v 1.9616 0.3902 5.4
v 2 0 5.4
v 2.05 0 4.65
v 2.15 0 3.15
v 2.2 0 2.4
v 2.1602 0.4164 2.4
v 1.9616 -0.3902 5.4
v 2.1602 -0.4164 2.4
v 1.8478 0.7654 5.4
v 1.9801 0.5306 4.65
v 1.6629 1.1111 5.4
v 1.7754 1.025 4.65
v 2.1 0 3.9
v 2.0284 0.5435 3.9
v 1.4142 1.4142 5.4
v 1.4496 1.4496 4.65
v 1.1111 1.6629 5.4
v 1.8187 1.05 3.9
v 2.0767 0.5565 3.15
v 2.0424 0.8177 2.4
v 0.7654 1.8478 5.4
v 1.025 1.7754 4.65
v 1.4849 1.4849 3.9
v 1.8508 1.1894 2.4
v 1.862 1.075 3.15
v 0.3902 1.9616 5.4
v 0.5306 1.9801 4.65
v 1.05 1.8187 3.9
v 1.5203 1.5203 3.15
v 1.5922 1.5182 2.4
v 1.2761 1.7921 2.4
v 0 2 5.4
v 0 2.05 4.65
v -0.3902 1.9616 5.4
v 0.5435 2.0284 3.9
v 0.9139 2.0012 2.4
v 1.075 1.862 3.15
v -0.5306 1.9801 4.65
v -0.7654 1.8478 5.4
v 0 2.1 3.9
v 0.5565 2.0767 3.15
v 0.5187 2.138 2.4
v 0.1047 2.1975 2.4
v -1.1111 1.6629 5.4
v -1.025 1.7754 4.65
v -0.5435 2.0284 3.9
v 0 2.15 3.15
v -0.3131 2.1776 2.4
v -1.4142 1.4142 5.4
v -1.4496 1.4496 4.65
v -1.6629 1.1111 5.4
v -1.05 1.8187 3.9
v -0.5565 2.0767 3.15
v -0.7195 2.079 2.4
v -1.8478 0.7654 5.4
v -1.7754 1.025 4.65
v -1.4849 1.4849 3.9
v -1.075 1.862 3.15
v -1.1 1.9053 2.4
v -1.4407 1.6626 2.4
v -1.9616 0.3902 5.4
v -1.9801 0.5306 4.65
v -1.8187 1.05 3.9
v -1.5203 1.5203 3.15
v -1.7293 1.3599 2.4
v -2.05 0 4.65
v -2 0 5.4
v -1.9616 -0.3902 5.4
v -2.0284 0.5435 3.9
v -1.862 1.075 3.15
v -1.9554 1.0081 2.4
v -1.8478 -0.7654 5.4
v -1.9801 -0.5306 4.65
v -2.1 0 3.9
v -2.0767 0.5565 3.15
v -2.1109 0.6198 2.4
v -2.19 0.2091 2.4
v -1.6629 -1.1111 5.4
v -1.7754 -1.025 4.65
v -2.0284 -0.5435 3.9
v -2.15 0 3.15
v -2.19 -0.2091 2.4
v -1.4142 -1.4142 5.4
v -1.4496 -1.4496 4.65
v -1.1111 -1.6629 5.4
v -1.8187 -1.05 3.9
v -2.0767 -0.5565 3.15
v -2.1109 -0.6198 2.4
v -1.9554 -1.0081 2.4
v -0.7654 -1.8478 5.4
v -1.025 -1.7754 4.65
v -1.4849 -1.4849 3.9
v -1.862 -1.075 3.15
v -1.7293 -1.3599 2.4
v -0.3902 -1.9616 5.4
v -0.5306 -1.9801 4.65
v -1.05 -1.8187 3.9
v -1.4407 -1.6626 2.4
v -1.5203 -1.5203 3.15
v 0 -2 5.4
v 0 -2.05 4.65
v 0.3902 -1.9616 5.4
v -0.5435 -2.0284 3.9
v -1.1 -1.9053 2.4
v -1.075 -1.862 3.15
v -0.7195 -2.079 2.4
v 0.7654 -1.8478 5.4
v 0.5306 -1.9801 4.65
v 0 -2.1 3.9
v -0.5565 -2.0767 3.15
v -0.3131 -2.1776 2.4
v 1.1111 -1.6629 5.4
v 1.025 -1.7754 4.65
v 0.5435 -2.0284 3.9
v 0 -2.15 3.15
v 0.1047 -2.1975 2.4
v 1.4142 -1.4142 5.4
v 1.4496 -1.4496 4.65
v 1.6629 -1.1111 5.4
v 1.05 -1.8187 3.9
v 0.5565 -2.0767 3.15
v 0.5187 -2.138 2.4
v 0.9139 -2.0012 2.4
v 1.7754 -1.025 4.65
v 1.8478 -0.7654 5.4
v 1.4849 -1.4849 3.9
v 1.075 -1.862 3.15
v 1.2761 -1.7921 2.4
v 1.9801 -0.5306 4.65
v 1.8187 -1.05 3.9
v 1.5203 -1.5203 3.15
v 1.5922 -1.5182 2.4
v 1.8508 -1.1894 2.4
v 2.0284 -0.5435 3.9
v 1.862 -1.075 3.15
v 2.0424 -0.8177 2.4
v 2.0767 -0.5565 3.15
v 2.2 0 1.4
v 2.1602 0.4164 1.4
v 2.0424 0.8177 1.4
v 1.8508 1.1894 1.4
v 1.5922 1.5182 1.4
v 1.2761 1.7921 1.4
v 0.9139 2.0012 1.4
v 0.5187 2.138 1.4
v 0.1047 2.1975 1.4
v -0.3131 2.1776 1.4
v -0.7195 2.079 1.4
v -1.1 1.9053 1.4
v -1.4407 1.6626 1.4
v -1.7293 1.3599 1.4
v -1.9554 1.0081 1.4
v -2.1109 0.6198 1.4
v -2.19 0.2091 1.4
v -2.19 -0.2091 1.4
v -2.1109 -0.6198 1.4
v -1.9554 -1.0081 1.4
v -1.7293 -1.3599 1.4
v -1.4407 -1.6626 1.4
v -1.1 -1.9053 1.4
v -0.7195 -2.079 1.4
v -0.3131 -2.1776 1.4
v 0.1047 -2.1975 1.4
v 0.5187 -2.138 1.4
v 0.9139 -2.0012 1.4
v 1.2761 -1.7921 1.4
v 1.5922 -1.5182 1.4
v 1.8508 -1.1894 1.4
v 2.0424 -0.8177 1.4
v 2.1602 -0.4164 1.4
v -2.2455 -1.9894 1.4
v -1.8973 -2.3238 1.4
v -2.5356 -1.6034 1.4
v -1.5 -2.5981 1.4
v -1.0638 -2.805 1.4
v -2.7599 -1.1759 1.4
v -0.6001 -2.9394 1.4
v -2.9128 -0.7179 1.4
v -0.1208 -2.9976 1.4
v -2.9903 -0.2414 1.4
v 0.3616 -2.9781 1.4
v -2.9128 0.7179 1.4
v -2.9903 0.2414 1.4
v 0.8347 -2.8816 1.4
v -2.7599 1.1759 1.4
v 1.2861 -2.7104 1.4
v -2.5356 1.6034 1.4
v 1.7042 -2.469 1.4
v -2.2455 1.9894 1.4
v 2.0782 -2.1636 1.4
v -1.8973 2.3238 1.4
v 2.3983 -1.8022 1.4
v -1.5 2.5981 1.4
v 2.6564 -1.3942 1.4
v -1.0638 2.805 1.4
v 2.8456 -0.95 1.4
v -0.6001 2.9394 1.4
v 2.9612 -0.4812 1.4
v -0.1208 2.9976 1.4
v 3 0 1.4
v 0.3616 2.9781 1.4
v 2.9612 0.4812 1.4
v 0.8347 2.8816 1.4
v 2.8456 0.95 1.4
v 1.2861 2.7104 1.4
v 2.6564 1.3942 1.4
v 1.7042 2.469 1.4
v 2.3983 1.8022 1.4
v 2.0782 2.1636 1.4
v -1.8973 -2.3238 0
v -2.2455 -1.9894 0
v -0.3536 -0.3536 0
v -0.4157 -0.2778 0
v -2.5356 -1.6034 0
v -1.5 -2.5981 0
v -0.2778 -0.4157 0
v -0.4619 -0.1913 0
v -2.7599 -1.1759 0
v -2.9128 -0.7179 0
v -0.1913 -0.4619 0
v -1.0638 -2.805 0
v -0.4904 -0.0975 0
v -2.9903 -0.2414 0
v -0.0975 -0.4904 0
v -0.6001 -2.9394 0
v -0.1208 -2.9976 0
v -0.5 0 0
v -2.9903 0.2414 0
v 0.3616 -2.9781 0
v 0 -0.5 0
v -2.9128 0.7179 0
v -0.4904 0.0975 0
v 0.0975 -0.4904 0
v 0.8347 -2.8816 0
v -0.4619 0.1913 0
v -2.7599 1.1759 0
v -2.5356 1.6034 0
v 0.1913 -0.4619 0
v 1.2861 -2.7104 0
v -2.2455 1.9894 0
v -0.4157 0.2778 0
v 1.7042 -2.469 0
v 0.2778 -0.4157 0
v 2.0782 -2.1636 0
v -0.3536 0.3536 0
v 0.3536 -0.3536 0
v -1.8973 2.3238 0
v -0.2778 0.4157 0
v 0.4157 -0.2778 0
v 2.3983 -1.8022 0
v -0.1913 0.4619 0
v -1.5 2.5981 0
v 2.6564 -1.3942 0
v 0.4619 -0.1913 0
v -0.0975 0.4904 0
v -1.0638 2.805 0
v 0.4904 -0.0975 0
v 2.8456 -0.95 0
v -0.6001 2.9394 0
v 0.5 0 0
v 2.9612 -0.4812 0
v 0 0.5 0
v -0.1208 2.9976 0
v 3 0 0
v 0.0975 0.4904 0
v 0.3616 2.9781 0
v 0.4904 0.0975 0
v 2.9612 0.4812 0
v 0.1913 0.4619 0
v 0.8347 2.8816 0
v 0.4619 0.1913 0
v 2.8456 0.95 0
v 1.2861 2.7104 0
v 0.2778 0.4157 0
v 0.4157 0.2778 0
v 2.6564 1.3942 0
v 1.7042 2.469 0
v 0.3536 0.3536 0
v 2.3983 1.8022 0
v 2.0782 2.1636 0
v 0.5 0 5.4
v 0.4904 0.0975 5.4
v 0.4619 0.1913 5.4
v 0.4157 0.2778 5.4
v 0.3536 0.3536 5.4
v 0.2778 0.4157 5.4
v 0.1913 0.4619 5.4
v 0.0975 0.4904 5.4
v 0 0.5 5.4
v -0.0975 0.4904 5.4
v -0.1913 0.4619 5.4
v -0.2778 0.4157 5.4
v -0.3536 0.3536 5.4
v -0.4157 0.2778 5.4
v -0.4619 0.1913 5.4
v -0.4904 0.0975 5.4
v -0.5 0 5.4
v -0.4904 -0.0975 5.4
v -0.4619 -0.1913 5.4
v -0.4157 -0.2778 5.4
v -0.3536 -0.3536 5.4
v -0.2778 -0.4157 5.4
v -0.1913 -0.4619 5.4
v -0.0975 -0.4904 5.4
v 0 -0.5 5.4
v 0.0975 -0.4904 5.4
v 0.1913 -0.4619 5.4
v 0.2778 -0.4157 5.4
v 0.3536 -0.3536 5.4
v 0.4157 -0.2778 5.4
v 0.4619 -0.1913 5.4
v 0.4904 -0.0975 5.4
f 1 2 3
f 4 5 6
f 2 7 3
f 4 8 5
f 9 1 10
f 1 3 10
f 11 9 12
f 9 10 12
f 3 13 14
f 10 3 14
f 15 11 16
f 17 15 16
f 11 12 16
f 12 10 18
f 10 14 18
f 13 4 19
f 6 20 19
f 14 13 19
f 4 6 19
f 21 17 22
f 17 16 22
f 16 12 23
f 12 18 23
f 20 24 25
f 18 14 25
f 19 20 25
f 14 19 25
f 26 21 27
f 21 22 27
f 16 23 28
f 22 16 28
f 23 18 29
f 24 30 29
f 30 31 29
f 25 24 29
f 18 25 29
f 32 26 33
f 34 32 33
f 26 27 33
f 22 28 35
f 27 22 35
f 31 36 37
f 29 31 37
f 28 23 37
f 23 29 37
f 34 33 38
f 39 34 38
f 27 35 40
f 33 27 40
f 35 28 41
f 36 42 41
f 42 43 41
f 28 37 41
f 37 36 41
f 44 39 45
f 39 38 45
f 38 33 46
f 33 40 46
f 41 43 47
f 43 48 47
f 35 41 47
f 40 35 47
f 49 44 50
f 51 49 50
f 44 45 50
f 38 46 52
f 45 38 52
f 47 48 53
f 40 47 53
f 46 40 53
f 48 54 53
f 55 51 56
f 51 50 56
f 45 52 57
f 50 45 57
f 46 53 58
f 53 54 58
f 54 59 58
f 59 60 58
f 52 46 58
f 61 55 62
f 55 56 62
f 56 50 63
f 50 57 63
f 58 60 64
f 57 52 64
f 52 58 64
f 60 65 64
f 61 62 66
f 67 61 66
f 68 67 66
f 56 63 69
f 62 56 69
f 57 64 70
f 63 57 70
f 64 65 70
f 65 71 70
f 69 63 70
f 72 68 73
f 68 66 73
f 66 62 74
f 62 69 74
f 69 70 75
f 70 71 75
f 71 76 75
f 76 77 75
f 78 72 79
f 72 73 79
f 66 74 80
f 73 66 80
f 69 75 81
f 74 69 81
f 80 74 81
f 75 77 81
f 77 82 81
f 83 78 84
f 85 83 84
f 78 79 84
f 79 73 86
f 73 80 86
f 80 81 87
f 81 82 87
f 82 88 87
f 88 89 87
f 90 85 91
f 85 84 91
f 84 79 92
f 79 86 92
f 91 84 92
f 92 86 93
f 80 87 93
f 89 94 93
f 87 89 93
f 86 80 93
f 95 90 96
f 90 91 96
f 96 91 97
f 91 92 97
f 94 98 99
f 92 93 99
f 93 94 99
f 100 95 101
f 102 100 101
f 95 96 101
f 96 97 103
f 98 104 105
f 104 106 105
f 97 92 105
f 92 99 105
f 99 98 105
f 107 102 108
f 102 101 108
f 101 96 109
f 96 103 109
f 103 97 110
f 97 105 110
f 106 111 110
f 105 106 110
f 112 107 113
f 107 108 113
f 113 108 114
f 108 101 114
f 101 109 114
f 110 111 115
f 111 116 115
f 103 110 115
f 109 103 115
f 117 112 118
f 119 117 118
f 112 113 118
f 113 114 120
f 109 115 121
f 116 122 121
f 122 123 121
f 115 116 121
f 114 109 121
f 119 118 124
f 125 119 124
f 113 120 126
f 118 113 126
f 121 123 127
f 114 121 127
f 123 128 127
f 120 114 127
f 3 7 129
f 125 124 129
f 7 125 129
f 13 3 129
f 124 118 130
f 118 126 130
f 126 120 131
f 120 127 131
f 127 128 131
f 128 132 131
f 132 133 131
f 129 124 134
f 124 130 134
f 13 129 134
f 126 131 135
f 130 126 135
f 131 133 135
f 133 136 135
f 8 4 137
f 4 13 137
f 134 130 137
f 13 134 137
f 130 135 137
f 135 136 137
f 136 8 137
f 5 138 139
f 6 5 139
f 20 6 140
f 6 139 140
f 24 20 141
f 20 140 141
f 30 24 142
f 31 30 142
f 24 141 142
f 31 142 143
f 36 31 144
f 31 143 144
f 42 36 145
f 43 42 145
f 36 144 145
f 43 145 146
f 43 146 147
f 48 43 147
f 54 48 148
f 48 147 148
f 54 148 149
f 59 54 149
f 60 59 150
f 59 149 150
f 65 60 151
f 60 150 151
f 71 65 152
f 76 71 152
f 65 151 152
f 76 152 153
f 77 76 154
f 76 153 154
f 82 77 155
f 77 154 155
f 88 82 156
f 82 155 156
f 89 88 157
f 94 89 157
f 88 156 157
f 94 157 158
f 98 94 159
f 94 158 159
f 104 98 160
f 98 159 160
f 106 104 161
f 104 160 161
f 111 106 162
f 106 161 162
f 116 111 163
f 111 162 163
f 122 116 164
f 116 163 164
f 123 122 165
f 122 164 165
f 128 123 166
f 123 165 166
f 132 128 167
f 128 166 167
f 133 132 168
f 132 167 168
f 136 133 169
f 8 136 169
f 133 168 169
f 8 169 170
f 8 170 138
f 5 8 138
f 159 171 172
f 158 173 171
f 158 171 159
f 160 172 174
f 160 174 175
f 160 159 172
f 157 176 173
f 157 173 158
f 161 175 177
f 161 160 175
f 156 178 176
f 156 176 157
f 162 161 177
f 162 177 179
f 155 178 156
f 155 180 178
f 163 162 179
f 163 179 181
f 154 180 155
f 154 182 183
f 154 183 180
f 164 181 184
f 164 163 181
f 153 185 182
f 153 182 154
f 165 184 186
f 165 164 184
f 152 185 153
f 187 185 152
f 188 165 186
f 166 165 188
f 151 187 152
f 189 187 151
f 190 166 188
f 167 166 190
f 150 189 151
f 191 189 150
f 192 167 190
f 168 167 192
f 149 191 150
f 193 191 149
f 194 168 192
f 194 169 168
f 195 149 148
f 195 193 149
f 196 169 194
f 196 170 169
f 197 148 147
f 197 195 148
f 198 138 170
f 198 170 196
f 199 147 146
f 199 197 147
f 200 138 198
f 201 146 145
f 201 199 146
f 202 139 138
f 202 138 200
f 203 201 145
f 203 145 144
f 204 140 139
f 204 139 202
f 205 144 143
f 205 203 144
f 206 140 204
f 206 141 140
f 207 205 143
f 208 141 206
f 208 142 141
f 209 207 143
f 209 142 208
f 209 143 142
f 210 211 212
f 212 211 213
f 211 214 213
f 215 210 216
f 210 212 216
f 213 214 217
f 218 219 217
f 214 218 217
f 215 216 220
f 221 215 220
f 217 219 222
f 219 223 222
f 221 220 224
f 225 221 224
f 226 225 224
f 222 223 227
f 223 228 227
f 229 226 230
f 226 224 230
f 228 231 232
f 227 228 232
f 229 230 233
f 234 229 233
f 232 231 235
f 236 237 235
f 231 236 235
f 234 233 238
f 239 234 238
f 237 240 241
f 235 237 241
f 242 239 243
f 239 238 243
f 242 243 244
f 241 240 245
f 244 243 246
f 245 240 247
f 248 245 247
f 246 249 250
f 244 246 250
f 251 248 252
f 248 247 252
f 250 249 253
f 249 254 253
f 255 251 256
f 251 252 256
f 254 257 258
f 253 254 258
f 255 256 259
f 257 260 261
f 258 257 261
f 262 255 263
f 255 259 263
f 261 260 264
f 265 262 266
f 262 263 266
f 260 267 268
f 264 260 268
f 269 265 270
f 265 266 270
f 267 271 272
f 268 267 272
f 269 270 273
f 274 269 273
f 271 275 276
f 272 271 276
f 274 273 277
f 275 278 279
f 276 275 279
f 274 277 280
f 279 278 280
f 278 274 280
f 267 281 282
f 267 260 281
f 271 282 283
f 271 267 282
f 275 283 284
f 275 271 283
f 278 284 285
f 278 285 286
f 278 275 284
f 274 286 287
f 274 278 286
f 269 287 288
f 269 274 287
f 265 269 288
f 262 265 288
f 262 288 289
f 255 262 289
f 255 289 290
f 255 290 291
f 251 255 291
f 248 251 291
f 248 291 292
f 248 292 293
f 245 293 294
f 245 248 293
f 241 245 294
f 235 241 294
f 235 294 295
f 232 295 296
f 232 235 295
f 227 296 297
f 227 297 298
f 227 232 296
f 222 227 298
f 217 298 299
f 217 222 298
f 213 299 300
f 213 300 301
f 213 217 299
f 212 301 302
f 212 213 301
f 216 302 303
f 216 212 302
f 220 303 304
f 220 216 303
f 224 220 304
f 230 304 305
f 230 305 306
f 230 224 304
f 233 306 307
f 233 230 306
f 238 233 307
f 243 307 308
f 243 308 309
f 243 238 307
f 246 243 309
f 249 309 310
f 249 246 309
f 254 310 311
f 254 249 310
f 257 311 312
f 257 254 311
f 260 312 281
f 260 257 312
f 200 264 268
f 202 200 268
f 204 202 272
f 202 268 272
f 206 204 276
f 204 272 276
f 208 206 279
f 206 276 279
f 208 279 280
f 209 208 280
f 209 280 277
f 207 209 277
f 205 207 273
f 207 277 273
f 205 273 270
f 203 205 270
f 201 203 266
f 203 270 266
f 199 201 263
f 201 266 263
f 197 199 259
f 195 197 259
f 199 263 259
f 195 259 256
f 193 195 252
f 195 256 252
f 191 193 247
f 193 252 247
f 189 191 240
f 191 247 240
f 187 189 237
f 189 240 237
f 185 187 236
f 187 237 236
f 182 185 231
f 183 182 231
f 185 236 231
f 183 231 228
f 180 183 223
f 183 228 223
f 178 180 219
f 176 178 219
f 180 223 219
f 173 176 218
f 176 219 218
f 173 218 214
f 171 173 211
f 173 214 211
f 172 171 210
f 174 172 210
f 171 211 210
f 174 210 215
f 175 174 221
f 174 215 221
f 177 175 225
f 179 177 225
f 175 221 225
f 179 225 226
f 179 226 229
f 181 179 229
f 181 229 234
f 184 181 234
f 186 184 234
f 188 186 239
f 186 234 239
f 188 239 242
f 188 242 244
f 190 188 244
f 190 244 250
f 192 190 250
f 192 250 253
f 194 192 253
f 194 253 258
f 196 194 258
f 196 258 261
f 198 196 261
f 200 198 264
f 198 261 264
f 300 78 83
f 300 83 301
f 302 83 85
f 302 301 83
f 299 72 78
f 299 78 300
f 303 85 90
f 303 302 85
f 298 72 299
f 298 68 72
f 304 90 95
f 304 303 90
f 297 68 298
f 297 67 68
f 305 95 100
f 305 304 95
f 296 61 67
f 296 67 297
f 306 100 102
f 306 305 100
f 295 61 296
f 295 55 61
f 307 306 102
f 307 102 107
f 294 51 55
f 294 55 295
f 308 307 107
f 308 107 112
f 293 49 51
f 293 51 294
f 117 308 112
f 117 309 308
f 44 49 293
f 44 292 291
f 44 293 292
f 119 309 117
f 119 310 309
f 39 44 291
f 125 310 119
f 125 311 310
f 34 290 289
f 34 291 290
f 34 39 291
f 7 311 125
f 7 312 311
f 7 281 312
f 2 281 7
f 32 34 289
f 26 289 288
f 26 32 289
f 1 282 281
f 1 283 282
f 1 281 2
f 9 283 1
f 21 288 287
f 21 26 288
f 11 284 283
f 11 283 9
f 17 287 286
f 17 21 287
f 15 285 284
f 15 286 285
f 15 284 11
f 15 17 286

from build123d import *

# Parameters (mm, degrees)
F0_R     = 3
F0_R_2   = 0.5
F1_DEPTH = 1.4
F2_R     = 2.2
F2_R_2   = 0.5
F3_DEPTH = 4
F4_SIZE2 = 3
F4_SIZE  = 0.2


with BuildPart() as f1:
    # F0 (on Top) → F1 (new body)
    with BuildSketch(Plane.XY):
        Circle(F0_R)
        Circle(F0_R_2, mode=Mode.SUBTRACT)
    extrude(amount=F1_DEPTH)

    # F2 (on face) → F3 (join)
    with BuildSketch(Plane.XY.offset(1.4)):
        Circle(F2_R)
        Circle(F2_R_2, mode=Mode.SUBTRACT)
    extrude(amount=F3_DEPTH)

    # F4
    f4_edges = [f1.edges().sort_by_distance(p)[0] for p in [
        (-2.2, 0, 5.4),
    ]]
    f4_side = f1.faces().sort_by_distance((-2.137775, 0, 5.4))[0]
    chamfer(f4_edges, length=F4_SIZE, length2=F4_SIZE2, reference=f4_side)


solid = f1.part
